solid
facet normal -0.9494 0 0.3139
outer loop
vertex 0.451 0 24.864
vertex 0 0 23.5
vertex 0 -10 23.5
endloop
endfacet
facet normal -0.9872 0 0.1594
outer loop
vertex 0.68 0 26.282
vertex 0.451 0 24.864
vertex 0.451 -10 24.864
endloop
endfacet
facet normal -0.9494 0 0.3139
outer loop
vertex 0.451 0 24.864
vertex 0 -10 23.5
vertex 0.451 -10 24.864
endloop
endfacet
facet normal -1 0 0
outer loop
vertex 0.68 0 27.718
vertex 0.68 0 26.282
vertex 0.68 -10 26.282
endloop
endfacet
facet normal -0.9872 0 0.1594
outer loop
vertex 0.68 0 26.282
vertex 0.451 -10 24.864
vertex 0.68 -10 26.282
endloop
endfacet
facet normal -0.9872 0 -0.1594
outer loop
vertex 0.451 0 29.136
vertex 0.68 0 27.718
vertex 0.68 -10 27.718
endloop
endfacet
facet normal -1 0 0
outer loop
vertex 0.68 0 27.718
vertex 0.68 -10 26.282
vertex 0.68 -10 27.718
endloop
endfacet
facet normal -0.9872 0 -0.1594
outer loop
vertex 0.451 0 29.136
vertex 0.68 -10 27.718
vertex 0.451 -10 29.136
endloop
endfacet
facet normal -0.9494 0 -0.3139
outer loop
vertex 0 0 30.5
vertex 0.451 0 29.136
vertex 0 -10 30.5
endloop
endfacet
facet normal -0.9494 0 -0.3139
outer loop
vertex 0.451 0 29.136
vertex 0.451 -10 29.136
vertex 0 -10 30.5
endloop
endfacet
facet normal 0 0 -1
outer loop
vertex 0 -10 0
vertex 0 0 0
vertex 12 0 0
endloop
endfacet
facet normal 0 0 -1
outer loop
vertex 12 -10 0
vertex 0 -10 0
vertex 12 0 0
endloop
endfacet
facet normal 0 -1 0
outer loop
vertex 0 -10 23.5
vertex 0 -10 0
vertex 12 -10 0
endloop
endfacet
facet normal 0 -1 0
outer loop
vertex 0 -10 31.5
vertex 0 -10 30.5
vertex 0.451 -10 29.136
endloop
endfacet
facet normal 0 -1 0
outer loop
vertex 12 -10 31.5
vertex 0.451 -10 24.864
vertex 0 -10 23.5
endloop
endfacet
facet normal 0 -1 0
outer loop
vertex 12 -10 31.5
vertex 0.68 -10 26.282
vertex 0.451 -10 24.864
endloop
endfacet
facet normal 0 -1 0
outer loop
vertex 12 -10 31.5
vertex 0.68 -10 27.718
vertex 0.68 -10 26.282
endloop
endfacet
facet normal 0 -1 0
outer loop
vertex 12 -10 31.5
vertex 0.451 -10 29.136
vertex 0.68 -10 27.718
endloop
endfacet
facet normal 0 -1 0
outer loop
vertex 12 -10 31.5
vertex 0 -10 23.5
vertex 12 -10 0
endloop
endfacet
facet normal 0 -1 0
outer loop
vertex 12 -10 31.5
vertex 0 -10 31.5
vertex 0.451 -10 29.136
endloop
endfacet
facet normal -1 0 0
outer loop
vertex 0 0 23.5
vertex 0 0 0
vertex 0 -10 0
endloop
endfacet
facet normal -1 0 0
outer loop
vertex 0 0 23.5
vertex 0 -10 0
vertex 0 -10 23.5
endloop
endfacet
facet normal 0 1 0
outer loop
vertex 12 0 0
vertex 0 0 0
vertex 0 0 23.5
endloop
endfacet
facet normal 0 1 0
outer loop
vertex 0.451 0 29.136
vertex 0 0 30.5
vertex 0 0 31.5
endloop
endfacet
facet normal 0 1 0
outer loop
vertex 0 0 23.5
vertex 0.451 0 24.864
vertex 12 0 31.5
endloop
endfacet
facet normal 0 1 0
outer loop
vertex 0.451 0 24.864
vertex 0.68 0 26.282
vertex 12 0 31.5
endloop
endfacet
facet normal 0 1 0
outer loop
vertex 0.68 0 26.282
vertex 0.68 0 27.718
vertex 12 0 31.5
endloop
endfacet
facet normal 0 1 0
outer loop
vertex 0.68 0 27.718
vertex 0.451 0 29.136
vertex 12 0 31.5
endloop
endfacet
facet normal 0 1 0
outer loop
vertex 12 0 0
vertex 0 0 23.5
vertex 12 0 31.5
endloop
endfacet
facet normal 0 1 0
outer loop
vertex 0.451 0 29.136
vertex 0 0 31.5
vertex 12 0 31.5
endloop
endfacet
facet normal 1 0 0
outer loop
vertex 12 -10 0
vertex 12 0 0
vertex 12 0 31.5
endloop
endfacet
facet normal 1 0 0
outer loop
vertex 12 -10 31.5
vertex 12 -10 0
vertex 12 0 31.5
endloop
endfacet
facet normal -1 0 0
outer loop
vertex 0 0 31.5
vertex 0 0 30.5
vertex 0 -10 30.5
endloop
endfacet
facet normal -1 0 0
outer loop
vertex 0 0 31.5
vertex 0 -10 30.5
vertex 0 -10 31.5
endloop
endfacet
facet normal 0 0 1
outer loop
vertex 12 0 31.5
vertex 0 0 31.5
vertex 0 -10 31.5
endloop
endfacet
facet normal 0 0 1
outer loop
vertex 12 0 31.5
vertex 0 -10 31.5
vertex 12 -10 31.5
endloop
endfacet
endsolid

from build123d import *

# Parameters (mm, degrees)
F0_W     = 12
F0_H     = 31.5
F1_DEPTH = 10
F3_DEPTH = 10.001


# Not quite as in the source:
# - a feature names something its author has since deleted; it is built from what else it names


with BuildPart() as f1:
    # F0 (on Front) → F1 (new body)
    with BuildSketch(Plane.XZ):
        with Locations((6, 15.75)):
            Rectangle(F0_W, F0_H)
    extrude(amount=F1_DEPTH)

    # F2 (on face) → F3 (cut, through all)
    with BuildSketch(Plane.XZ.offset(10)):
        with BuildLine():
            Line((0, 30.5), (0, 23.5))
            ThreePointArc((0, 23.5), (0.7084380241, 27), (0, 30.5))
        make_face()
    extrude(amount=-F3_DEPTH, mode=Mode.SUBTRACT)


solid = f1.part
